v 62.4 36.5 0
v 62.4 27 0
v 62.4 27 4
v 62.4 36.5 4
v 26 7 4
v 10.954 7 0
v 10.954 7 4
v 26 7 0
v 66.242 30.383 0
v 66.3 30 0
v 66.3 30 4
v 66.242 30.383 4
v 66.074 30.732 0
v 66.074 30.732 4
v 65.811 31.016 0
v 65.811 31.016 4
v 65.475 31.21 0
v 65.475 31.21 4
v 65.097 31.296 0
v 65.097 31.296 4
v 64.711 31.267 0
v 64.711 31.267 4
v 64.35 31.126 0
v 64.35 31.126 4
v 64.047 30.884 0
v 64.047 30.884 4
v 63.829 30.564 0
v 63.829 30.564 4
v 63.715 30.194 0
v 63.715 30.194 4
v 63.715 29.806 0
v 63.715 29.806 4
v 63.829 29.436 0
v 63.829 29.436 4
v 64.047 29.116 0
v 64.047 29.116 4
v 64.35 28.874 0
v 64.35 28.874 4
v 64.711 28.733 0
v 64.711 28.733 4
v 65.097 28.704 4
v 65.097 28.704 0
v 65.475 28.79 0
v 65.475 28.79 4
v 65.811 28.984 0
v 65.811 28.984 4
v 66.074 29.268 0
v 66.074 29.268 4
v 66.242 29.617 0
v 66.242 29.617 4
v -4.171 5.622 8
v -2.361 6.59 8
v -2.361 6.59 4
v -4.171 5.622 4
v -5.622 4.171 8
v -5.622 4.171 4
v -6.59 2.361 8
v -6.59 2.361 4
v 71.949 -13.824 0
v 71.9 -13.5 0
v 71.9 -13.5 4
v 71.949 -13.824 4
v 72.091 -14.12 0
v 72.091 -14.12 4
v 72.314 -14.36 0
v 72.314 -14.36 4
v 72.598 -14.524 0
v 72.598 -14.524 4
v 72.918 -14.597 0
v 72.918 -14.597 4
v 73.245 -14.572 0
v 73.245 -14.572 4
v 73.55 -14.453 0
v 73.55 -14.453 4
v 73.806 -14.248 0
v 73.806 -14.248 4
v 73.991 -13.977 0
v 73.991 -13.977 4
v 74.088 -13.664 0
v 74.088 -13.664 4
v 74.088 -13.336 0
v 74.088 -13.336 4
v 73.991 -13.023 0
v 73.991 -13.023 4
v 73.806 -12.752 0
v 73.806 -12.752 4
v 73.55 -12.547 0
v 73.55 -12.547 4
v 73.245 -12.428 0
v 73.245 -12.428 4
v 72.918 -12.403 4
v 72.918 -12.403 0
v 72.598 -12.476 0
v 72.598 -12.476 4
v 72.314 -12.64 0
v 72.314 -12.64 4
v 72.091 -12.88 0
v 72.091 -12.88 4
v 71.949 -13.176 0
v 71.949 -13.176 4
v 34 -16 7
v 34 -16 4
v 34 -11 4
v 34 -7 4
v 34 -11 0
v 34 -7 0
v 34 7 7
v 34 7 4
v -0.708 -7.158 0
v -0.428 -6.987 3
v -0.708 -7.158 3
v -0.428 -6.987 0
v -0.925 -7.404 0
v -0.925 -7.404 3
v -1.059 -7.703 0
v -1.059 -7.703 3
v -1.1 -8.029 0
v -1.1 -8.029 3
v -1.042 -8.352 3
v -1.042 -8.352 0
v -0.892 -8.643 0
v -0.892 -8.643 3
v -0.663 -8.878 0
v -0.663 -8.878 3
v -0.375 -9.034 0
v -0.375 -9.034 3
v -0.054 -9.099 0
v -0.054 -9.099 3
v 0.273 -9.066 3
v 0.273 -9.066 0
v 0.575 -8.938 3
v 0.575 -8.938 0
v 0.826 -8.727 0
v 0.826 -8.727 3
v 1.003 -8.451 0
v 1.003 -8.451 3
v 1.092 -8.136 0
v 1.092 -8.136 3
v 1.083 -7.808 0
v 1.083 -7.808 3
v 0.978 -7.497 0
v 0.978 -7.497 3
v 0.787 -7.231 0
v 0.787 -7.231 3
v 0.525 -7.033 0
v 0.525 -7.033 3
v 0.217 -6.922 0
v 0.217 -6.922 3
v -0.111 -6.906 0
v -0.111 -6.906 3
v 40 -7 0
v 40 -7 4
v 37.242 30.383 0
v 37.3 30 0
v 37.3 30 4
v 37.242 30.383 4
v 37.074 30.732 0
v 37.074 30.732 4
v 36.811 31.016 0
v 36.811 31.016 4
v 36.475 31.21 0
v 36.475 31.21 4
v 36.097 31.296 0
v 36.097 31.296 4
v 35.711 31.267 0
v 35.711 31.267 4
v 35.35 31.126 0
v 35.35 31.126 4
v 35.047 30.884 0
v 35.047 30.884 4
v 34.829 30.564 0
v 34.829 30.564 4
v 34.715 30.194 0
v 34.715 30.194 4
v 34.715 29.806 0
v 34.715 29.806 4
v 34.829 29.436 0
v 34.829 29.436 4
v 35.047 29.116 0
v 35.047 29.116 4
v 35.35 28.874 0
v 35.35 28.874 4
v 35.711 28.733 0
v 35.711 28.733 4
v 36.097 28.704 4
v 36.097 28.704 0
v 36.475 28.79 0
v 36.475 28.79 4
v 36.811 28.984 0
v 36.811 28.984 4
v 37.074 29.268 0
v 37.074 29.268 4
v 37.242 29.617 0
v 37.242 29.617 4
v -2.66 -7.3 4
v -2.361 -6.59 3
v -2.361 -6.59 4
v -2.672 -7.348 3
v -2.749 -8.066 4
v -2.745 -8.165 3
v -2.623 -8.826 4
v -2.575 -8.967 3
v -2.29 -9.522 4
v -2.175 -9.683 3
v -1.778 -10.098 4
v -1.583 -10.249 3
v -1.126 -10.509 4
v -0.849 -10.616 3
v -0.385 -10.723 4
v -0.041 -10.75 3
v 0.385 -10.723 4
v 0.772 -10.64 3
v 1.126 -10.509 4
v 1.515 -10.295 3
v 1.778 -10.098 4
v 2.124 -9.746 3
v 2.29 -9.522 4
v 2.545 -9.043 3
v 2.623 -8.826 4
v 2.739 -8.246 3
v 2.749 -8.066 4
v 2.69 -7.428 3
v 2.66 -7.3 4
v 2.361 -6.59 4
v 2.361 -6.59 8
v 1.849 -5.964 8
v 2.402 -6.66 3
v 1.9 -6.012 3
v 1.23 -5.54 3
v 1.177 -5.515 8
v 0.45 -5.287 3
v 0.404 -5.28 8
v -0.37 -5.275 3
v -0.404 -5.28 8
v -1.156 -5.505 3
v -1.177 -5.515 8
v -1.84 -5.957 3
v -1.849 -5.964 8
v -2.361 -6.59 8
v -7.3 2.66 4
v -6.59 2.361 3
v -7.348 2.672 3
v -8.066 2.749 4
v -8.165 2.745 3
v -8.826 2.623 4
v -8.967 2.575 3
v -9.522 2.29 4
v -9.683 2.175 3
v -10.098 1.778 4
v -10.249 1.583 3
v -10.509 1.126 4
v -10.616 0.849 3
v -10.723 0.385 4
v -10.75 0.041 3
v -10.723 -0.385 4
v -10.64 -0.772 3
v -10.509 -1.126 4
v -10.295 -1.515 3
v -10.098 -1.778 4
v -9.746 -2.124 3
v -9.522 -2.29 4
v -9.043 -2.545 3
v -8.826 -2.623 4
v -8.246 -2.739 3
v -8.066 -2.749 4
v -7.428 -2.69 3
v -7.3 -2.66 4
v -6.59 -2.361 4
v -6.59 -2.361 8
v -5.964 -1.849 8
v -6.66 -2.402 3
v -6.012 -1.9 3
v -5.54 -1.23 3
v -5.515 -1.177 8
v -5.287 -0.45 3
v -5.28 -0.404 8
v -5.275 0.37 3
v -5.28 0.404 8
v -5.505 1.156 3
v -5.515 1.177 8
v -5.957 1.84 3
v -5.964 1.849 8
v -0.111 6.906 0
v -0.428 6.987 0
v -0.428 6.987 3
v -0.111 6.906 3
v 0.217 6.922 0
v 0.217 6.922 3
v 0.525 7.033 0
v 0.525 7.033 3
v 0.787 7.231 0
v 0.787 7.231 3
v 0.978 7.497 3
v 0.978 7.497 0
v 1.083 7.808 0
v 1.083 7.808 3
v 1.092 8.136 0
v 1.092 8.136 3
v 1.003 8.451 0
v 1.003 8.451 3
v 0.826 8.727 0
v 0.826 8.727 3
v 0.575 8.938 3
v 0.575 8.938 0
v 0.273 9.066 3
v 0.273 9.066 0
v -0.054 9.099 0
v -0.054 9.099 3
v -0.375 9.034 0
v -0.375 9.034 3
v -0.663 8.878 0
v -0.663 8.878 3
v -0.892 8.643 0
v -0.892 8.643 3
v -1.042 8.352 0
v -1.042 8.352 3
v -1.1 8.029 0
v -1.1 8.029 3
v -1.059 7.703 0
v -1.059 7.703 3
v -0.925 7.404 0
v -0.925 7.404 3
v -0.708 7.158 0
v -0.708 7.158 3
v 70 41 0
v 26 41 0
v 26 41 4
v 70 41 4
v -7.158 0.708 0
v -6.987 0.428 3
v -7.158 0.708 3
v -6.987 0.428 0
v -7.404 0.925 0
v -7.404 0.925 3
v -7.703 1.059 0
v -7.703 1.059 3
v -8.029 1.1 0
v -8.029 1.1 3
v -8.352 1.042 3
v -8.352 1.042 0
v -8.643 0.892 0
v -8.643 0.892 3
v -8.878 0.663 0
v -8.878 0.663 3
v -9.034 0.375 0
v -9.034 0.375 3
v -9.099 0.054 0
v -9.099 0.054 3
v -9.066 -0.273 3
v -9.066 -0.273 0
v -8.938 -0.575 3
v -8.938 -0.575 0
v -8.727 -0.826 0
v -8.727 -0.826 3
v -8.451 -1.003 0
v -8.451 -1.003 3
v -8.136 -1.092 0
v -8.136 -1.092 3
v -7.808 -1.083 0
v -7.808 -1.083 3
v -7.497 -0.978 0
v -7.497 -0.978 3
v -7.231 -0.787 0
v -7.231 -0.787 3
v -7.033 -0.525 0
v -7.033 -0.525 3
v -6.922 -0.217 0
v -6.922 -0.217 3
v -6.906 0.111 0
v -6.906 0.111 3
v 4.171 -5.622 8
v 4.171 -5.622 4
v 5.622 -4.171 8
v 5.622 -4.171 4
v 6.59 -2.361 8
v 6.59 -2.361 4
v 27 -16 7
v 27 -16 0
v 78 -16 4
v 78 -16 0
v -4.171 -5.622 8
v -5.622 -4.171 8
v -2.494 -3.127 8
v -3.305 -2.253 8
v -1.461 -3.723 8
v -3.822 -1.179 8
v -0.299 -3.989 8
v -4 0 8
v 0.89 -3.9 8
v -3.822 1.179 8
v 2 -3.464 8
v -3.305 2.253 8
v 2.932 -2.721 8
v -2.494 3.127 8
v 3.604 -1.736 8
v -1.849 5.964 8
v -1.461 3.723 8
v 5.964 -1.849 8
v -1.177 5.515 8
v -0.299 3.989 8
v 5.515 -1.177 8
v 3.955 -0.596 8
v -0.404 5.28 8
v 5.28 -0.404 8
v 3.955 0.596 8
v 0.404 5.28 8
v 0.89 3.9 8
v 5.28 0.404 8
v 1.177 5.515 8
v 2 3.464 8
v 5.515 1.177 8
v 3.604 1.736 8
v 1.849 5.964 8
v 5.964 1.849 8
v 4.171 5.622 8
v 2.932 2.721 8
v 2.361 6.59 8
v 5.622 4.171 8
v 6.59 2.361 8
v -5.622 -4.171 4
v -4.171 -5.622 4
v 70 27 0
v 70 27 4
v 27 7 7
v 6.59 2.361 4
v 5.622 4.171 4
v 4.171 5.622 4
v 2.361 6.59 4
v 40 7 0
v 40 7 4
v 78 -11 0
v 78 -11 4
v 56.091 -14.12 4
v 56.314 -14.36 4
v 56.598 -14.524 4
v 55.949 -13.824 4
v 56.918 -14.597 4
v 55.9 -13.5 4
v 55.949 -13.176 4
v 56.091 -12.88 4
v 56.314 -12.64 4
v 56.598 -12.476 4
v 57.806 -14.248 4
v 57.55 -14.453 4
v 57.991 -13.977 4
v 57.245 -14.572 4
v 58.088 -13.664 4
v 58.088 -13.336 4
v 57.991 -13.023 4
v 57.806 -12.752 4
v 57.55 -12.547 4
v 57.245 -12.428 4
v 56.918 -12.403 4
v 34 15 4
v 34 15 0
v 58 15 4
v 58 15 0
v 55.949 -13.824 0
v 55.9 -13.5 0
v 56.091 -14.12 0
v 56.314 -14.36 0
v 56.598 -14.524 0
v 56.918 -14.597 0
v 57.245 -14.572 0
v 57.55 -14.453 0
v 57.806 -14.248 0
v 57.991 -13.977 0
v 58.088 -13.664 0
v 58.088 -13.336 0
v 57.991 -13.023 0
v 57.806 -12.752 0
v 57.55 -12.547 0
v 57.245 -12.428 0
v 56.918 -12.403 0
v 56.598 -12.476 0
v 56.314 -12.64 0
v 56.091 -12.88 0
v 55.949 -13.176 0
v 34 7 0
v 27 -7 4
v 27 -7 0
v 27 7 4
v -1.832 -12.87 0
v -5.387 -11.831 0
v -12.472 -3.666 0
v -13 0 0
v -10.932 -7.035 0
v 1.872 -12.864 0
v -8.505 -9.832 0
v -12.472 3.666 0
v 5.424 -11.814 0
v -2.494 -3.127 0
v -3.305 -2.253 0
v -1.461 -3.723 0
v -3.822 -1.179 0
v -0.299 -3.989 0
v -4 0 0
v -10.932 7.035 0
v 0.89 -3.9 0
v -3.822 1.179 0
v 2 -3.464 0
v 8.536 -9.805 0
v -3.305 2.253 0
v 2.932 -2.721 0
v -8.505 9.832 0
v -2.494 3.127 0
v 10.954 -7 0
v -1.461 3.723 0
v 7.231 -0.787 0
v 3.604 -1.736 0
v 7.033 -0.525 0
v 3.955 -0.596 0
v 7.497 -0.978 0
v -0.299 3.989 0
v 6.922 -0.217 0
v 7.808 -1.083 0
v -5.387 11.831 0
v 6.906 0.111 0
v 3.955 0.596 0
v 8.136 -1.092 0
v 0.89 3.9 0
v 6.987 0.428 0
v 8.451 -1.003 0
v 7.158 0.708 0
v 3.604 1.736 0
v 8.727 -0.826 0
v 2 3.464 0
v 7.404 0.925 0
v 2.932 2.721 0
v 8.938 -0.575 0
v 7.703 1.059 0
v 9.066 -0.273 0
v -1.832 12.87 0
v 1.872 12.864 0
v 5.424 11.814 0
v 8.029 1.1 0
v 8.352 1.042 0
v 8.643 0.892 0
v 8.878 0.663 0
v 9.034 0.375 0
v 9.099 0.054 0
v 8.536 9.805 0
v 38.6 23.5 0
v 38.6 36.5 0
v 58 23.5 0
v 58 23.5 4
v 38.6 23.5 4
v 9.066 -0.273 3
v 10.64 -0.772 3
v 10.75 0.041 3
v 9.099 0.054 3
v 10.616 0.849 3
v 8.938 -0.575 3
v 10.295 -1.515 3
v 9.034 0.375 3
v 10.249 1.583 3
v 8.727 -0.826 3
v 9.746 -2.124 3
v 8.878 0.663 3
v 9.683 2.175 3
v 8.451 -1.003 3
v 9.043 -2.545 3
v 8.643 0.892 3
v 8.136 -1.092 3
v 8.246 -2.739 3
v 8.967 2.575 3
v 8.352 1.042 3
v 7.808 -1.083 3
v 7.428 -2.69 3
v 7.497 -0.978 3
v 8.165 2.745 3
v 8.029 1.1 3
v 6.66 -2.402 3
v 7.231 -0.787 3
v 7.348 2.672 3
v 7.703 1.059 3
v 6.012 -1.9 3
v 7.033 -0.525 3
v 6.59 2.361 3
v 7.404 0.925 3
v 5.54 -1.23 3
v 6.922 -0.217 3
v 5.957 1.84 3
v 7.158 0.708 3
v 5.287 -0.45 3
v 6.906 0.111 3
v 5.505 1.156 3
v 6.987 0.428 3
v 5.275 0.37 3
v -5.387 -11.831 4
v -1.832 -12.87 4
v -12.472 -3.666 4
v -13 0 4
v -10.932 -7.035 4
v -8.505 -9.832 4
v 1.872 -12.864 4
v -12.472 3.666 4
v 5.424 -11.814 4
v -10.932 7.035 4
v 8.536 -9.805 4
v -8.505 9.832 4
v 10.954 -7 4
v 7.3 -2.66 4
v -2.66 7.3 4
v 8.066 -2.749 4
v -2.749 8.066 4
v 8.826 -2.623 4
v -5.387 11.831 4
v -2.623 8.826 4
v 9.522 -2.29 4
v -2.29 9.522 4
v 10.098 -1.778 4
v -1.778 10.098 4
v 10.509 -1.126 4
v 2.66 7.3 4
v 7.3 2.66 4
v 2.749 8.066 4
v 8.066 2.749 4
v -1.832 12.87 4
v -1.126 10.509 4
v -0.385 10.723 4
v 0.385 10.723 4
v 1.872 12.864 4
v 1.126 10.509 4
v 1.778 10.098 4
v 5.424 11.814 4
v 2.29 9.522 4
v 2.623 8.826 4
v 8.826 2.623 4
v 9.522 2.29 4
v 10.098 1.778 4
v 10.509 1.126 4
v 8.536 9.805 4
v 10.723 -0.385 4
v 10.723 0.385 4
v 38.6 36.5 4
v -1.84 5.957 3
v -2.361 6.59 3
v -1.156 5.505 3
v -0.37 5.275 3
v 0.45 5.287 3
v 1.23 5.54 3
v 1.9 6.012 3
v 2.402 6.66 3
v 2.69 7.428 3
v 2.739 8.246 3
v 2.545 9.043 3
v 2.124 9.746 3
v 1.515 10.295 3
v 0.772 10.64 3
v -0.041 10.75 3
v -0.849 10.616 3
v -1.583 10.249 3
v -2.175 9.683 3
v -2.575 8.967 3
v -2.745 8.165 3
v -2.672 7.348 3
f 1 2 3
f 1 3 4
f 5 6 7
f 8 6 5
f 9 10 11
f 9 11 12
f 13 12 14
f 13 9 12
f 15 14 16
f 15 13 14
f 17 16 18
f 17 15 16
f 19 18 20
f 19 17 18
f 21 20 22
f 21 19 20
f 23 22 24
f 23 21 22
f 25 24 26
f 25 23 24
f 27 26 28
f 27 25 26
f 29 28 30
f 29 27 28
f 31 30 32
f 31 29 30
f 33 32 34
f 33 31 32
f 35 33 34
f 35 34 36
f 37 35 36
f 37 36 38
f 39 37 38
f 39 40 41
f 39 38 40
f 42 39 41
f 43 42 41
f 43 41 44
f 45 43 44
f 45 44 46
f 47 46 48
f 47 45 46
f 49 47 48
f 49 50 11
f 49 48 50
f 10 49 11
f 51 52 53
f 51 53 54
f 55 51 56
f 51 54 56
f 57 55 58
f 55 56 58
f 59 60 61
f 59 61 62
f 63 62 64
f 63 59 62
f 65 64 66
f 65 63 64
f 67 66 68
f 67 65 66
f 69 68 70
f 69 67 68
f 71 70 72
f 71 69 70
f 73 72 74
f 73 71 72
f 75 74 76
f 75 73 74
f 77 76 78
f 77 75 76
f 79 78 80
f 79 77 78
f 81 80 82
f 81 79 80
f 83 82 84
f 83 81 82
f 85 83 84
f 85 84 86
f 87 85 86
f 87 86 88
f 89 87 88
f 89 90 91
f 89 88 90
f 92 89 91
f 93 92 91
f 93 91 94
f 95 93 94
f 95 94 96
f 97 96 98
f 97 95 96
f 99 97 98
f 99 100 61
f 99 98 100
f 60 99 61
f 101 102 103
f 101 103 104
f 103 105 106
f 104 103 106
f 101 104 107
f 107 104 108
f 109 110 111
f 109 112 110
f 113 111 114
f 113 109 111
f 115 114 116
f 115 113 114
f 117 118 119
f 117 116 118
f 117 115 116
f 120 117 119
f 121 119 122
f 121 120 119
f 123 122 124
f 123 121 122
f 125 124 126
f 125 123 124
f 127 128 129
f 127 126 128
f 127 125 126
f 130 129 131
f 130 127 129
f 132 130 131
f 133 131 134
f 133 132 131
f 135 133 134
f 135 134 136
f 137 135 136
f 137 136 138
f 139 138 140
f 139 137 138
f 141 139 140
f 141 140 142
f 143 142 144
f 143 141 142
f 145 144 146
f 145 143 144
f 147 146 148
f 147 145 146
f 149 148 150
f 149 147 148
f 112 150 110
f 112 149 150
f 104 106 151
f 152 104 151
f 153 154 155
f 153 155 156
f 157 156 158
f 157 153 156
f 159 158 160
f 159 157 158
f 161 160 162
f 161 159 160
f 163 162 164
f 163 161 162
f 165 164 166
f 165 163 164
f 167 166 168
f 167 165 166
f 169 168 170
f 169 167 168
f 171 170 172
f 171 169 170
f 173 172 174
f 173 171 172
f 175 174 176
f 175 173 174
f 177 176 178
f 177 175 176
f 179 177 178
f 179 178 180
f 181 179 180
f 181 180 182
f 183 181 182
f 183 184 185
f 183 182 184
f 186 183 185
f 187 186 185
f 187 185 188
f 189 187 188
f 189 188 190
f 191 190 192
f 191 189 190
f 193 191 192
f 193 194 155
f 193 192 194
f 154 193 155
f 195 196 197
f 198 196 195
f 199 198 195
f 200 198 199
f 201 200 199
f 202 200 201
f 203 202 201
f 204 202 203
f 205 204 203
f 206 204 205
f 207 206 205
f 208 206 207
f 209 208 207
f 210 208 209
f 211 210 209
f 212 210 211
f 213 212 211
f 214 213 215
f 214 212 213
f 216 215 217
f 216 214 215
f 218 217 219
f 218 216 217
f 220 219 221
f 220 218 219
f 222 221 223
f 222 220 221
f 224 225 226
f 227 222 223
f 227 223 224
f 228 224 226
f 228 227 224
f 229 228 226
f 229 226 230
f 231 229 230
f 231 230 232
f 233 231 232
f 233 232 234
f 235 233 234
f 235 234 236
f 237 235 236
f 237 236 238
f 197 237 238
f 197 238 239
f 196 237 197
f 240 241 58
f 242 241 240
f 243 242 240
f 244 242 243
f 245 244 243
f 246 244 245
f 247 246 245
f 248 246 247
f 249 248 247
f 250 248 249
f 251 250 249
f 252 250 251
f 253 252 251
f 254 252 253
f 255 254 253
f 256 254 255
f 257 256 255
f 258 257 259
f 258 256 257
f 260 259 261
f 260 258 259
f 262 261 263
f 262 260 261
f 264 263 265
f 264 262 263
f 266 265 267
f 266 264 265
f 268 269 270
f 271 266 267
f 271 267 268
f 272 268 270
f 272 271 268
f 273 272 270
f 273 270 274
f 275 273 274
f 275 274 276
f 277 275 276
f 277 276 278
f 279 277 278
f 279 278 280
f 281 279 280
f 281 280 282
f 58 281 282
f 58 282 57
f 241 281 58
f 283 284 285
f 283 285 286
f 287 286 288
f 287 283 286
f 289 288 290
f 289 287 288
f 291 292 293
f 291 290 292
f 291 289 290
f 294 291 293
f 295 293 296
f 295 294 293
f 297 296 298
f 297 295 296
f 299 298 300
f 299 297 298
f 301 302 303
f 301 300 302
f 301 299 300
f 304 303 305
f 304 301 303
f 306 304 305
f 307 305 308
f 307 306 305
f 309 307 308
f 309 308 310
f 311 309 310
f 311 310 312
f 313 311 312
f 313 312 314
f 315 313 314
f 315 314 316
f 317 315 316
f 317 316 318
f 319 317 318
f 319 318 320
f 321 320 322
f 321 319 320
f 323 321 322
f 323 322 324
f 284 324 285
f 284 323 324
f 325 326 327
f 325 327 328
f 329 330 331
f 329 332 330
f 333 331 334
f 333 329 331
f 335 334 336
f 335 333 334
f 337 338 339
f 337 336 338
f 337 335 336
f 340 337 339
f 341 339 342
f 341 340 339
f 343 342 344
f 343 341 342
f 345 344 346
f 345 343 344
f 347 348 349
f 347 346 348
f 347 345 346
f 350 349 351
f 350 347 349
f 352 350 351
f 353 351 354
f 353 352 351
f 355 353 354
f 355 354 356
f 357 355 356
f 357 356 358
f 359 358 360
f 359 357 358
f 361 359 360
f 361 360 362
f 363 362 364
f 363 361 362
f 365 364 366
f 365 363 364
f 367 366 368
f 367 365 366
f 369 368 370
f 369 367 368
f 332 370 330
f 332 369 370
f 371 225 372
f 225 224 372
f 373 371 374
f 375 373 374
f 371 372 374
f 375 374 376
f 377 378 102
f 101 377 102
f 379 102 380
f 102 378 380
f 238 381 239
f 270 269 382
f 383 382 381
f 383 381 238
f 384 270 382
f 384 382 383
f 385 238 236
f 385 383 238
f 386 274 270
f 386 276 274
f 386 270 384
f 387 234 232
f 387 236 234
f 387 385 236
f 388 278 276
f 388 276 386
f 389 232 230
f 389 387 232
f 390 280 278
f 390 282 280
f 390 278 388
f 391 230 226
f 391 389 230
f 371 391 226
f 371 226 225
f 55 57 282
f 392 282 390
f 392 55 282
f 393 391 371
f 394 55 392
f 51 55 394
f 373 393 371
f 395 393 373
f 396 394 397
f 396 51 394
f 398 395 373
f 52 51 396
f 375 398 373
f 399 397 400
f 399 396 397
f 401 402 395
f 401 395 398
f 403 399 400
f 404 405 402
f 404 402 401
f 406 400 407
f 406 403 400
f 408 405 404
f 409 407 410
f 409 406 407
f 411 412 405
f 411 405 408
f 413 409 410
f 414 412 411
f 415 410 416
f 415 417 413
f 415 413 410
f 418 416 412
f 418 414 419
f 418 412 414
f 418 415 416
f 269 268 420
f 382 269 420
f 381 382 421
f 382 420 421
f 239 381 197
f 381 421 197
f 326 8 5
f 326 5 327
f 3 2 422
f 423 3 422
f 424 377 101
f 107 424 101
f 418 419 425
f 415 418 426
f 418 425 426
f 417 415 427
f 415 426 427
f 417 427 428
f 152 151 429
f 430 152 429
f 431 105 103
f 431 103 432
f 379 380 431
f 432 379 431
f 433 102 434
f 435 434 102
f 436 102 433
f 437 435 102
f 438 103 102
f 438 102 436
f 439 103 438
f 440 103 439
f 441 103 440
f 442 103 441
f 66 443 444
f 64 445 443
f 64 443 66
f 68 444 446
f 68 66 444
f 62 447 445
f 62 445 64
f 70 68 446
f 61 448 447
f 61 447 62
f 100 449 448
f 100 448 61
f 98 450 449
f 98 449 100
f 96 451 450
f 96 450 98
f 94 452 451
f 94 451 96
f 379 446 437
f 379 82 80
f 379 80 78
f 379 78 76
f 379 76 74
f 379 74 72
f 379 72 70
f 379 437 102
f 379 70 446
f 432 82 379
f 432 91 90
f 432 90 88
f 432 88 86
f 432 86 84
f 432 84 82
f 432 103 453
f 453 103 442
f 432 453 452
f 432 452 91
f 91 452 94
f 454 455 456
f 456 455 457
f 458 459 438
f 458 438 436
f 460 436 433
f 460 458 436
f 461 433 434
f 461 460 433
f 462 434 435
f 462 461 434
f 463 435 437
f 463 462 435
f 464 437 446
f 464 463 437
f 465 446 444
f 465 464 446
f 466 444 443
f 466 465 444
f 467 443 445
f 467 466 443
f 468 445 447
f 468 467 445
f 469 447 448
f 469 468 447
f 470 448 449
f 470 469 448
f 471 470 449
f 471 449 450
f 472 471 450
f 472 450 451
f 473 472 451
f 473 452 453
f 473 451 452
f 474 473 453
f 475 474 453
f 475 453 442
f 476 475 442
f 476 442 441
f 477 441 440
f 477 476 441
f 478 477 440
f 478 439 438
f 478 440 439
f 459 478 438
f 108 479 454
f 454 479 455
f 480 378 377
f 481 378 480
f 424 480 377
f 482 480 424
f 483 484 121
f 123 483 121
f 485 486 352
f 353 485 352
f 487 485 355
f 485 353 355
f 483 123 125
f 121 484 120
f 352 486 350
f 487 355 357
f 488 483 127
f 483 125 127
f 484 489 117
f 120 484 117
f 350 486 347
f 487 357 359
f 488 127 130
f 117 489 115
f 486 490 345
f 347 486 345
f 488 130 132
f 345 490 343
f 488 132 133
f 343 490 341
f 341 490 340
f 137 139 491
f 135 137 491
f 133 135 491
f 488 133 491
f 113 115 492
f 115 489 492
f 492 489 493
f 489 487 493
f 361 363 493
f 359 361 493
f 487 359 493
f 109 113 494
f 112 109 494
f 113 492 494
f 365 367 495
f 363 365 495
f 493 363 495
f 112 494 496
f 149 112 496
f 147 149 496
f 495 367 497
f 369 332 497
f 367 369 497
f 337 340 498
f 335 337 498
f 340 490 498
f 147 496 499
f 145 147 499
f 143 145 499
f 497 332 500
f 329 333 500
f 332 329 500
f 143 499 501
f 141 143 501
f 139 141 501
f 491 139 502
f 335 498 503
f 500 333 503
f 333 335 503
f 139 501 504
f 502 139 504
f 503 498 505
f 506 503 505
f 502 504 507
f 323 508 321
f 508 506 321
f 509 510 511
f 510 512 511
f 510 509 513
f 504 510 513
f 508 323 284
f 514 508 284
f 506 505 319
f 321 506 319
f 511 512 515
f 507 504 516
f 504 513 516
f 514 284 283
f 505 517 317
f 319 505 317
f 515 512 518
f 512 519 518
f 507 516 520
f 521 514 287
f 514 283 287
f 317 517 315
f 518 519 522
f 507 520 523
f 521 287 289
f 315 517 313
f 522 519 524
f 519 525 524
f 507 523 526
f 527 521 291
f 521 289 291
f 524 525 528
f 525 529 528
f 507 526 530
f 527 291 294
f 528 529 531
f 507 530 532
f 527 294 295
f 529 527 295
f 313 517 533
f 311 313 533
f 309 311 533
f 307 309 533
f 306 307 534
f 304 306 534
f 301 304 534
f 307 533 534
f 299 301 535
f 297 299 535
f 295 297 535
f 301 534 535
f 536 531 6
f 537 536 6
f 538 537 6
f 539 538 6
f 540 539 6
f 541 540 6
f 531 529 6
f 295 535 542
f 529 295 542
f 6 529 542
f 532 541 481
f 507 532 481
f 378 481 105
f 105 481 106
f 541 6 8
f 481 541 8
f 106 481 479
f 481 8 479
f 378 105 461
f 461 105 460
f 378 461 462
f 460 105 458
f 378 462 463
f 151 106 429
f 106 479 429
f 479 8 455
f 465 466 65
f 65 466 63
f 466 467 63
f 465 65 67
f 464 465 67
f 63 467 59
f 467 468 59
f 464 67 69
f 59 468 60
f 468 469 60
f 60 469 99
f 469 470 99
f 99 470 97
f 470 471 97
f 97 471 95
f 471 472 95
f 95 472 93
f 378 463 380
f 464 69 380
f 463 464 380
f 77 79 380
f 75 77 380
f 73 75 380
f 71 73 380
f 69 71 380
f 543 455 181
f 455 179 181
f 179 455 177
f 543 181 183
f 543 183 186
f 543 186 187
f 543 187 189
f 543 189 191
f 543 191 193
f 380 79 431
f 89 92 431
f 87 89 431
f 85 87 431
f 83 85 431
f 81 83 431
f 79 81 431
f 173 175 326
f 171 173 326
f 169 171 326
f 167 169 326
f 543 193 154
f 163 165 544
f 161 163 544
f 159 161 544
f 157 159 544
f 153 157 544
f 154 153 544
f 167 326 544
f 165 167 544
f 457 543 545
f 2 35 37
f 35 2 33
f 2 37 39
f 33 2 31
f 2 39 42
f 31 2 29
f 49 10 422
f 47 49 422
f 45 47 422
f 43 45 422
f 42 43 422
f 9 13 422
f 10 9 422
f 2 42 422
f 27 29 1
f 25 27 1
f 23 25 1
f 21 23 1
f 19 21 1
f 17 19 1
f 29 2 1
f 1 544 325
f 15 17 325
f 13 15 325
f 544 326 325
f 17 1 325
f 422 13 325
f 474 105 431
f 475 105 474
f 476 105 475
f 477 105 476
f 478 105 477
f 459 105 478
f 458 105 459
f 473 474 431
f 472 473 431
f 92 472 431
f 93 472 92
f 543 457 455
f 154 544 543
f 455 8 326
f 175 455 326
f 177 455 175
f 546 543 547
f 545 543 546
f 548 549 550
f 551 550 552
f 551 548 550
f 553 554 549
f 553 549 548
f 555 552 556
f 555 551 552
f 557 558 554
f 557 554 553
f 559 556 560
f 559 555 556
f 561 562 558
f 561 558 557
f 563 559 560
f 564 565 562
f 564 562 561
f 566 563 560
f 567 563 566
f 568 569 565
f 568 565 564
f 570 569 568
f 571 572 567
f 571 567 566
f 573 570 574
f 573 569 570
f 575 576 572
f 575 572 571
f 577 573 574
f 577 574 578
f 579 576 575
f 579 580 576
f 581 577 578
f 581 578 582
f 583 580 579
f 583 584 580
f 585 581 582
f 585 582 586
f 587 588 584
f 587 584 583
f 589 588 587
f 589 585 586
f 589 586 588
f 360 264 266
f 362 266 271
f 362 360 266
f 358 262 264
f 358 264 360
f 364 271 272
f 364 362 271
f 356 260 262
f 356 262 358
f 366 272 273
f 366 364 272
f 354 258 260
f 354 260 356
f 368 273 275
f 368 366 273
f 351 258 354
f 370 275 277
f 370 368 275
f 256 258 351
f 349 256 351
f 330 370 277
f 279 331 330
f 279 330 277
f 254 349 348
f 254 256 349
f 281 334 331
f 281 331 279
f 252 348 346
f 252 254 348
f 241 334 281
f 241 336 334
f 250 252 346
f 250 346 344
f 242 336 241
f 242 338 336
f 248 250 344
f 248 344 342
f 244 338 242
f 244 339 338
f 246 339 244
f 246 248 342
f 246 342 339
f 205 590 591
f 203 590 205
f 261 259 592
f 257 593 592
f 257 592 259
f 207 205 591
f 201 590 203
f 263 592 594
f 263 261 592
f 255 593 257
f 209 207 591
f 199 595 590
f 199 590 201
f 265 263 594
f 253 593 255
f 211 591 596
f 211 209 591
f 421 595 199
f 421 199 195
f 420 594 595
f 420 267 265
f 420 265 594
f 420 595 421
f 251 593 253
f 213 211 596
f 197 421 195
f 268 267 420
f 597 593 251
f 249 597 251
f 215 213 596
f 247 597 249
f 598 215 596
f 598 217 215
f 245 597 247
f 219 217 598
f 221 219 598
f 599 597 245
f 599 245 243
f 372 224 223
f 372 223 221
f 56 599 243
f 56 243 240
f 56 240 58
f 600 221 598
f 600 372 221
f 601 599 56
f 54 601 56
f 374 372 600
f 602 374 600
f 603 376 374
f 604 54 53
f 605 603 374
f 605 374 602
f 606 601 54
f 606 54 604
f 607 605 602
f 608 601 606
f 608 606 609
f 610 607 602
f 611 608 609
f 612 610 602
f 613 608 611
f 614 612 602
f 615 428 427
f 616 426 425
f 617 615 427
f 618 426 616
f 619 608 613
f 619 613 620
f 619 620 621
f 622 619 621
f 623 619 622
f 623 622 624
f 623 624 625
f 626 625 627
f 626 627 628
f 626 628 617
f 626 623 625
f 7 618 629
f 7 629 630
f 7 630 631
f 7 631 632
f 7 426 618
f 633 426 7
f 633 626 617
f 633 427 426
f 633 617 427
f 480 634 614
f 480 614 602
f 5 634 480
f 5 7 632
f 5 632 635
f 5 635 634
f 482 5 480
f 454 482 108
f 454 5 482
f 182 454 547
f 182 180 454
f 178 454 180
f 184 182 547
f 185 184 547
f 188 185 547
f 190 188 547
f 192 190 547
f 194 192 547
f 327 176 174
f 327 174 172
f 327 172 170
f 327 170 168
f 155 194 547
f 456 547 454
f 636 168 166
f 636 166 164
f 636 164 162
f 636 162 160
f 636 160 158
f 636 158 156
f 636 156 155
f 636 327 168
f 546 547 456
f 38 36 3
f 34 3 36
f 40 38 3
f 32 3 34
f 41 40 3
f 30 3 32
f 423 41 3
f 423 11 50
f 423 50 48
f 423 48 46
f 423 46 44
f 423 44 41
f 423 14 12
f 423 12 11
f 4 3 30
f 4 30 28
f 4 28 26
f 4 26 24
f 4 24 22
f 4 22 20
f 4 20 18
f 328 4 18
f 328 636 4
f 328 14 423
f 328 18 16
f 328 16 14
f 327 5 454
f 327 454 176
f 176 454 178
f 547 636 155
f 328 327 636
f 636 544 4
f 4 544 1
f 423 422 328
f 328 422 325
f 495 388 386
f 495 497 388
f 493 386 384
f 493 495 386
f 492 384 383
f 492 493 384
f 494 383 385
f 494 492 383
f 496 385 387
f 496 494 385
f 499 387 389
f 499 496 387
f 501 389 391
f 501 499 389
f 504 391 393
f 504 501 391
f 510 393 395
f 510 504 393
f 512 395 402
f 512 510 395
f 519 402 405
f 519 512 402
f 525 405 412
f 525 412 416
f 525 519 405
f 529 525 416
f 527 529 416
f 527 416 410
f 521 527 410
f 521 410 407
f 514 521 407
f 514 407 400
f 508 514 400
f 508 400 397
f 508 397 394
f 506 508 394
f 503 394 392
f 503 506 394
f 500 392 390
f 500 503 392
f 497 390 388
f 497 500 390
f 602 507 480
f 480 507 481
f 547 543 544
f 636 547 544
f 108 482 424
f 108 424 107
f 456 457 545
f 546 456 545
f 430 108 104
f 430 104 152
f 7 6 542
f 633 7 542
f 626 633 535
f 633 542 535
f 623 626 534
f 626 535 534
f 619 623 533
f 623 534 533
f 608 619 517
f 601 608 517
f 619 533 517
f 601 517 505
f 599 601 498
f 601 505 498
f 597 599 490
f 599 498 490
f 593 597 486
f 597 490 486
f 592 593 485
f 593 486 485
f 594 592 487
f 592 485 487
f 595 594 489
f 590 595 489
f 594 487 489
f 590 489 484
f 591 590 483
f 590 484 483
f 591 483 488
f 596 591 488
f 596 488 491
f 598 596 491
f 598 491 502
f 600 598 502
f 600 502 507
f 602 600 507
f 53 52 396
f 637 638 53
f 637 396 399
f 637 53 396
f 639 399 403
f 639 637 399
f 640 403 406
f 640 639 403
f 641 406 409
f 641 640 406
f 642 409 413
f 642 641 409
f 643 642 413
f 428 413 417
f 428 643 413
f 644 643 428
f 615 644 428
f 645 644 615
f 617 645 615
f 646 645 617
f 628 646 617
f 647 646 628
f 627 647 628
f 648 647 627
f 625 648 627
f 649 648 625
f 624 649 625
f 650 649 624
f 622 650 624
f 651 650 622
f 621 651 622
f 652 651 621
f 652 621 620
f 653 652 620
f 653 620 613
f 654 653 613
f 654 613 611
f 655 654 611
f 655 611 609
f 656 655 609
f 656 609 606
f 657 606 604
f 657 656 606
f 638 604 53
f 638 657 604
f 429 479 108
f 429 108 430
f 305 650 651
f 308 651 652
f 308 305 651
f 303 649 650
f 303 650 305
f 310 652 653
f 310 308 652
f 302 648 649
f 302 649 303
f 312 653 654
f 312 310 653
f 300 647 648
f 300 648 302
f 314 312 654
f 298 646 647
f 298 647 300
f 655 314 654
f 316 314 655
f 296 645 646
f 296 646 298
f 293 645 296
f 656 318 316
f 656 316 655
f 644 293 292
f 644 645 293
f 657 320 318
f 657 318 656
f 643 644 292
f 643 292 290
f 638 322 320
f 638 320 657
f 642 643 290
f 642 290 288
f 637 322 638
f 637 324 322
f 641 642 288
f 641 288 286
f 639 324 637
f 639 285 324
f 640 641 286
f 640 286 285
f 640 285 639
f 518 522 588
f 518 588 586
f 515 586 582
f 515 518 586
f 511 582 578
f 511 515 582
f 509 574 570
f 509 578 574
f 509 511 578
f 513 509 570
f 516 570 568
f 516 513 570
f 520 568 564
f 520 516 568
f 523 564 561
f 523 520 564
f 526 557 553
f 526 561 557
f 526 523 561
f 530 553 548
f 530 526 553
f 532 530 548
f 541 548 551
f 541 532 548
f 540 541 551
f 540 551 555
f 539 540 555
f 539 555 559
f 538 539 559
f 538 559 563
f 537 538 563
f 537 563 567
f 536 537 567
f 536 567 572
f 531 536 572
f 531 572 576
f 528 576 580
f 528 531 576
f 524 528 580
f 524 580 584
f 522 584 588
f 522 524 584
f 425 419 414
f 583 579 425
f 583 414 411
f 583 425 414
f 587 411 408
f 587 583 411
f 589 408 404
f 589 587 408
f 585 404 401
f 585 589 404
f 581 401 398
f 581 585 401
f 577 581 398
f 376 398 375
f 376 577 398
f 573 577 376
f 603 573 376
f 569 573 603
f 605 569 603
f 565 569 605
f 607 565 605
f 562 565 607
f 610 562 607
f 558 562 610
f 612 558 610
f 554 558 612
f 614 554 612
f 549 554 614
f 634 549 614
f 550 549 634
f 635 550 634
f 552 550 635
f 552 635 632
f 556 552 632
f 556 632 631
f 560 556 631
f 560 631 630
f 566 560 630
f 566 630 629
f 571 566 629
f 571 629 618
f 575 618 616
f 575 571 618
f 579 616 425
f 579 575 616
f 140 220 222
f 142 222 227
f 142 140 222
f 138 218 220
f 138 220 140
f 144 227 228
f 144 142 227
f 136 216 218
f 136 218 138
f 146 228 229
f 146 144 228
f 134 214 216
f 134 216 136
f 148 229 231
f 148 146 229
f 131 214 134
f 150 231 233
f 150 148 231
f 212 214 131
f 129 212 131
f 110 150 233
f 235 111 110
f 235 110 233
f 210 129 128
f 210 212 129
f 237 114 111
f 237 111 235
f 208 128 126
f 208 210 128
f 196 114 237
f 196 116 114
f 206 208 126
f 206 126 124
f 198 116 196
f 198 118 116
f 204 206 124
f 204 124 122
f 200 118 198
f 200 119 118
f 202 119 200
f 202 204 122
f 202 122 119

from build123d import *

# Parameters (mm, degrees)
ELBOW_HORN_FLANGE_PROFILE_R          = 13
ELBOW_HORN_FLANGE_DEPTH              = 4
FOREARM_WEB_PROFILE_W                = 40
FOREARM_WEB_PROFILE_H                = 14
FOREARM_WEB_DEPTH                    = 4
GRIPPER_MOUNT_RIB_PROFILE_W          = 8
GRIPPER_MOUNT_RIB_PROFILE_H          = 30
GRIPPER_MOUNT_RIB_DEPTH              = 4
GRIPPER_SERVO_MOUNT_PROFILE_W        = 44
GRIPPER_SERVO_MOUNT_PROFILE_H        = 26
GRIPPER_SERVO_MOUNT_DEPTH            = 4
GRIP_SG90_BODY_CLEARANCE_START       = -5
GRIP_SG90_BODY_CLEARANCE_PROFILE_W   = 23.8
GRIP_SG90_BODY_CLEARANCE_PROFILE_H   = 13
GRIP_SG90_BODY_CLEARANCE_DEPTH       = 87.221918224
MOVING_FINGER_SWEEP_RELIEF_START     = -5
MOVING_FINGER_SWEEP_RELIEF_PROFILE_W = 13
MOVING_FINGER_SWEEP_RELIEF_PROFILE_H = 13
MOVING_FINGER_SWEEP_RELIEF_DEPTH     = 87.221918224
GRIP_SERVO_TAB_FASTENERS_START       = -50
GRIP_SERVO_TAB_FASTENERS_PROFILE_R   = 1.3
GRIP_SERVO_TAB_FASTENERS_DEPTH       = 132.221918224
FIXED_FINGER_SPINE_PROFILE_W         = 48
FIXED_FINGER_SPINE_PROFILE_H         = 5
FIXED_FINGER_SPINE_DEPTH             = 4
FIXED_FINGER_ROOT_PROFILE_W          = 7
FIXED_FINGER_ROOT_PROFILE_H          = 23
FIXED_FINGER_ROOT_DEPTH              = 7
ELBOW_CENTER_SCREW_ACCESS_START      = -50
ELBOW_CENTER_SCREW_ACCESS_PROFILE_R  = 4
ELBOW_CENTER_SCREW_ACCESS_DEPTH      = 139.396832522
ELBOW_DOWEL_SUPPORT_HUB_START        = 4
ELBOW_DOWEL_SUPPORT_HUB_PROFILE_R    = 7
ELBOW_DOWEL_SUPPORT_HUB_PROFILE_R_2  = 4
ELBOW_DOWEL_SUPPORT_HUB_DEPTH        = 4
ELBOW_HORN_FASTENERS_START           = -50
ELBOW_HORN_FASTENERS_PROFILE_R       = 1.1
ELBOW_HORN_FASTENERS_DEPTH           = 139.481636513
M2X8_WASHER_AND_HUB_CLEARANCE_START  = 3
ELBOW_HORN_WASHER_RECESS_PROFILE_R   = 2.75
M2X8_WASHER_AND_HUB_CLEARANCE_DEPTH  = 5
FIXED_PAD_KEEPER_FASTENERS_START     = -50
FIXED_PAD_KEEPER_FASTENERS_PROFILE_R = 1.1
FIXED_PAD_KEEPER_FASTENERS_DEPTH     = 139.481636513


with BuildPart() as part:
    # Elbow_horn_flange_profile → Elbow_horn_flange (new body)
    with BuildSketch(Plane.XY):
        Circle(ELBOW_HORN_FLANGE_PROFILE_R)
    extrude(amount=ELBOW_HORN_FLANGE_DEPTH)

    # Forearm_web_profile → Forearm_web (add)
    with BuildSketch(Plane.XY):
        with Locations((20, 0)):
            Rectangle(FOREARM_WEB_PROFILE_W, FOREARM_WEB_PROFILE_H)
    extrude(amount=FOREARM_WEB_DEPTH)

    # Gripper_mount_rib_profile → Gripper_mount_rib (add)
    with BuildSketch(Plane.XY):
        with Locations((30, 15)):
            Rectangle(GRIPPER_MOUNT_RIB_PROFILE_W, GRIPPER_MOUNT_RIB_PROFILE_H)
    extrude(amount=GRIPPER_MOUNT_RIB_DEPTH)

    # Gripper_servo_mount_profile → Gripper_servo_mount (add)
    with BuildSketch(Plane.XY):
        with Locations((48, 28)):
            Rectangle(GRIPPER_SERVO_MOUNT_PROFILE_W, GRIPPER_SERVO_MOUNT_PROFILE_H)
    extrude(amount=GRIPPER_SERVO_MOUNT_DEPTH)

    # Grip_SG90_body_clearance_profile → Grip_SG90_body_clearance (cut, through all)
    with BuildSketch(Plane.XY.offset(GRIP_SG90_BODY_CLEARANCE_START)):
        with Locations((50.5, 30)):
            Rectangle(GRIP_SG90_BODY_CLEARANCE_PROFILE_W, GRIP_SG90_BODY_CLEARANCE_PROFILE_H)
    extrude(amount=GRIP_SG90_BODY_CLEARANCE_DEPTH, mode=Mode.SUBTRACT)

    # Moving_finger_sweep_relief_profile → Moving_finger_sweep_relief (cut, through all)
    with BuildSketch(Plane.XY.offset(MOVING_FINGER_SWEEP_RELIEF_START)):
        with Locations((64.5, 20.5)):
            Rectangle(MOVING_FINGER_SWEEP_RELIEF_PROFILE_W, MOVING_FINGER_SWEEP_RELIEF_PROFILE_H)
    extrude(amount=MOVING_FINGER_SWEEP_RELIEF_DEPTH, mode=Mode.SUBTRACT)

    # Grip_servo_tab_fasteners_profile → Grip_servo_tab_fasteners (cut, through all)
    with BuildSketch(Plane.XY.offset(GRIP_SERVO_TAB_FASTENERS_START)):
        with Locations((36, 30)):
            Circle(GRIP_SERVO_TAB_FASTENERS_PROFILE_R)
        with Locations((65, 30)):
            Circle(GRIP_SERVO_TAB_FASTENERS_PROFILE_R)
    extrude(amount=GRIP_SERVO_TAB_FASTENERS_DEPTH, mode=Mode.SUBTRACT)



with BuildPart() as body_2:
    # Fixed_finger_spine_profile → Fixed_finger_spine (new body)
    with BuildSketch(Plane.XY):
        with Locations((54, -13.5)):
            Rectangle(FIXED_FINGER_SPINE_PROFILE_W, FIXED_FINGER_SPINE_PROFILE_H)
    extrude(amount=FIXED_FINGER_SPINE_DEPTH)


with BuildPart() as part_1:
    add(part.part)

    add(body_2.part)  # Fixed_finger_root merges body 2
    # Fixed_finger_root_profile → Fixed_finger_root (add)
    with BuildSketch(Plane.XY):
        with Locations((30.5, -4.5)):
            Rectangle(FIXED_FINGER_ROOT_PROFILE_W, FIXED_FINGER_ROOT_PROFILE_H)
    extrude(amount=FIXED_FINGER_ROOT_DEPTH)

    # Elbow_center_screw_access_profile → Elbow_center_screw_access (cut, through all)
    with BuildSketch(Plane.XY.offset(ELBOW_CENTER_SCREW_ACCESS_START)):
        with Locations(Location((0, 0, 0), (0, 0, 180))):
            Circle(ELBOW_CENTER_SCREW_ACCESS_PROFILE_R)
    extrude(amount=ELBOW_CENTER_SCREW_ACCESS_DEPTH, mode=Mode.SUBTRACT)

    # Elbow_dowel_support_hub_profile → Elbow_dowel_support_hub (add)
    with BuildSketch(Plane.XY.offset(ELBOW_DOWEL_SUPPORT_HUB_START)):
        Circle(ELBOW_DOWEL_SUPPORT_HUB_PROFILE_R)
        with Locations(Location((0, 0, 0), (0, 0, 180))):
            Circle(ELBOW_DOWEL_SUPPORT_HUB_PROFILE_R_2, mode=Mode.SUBTRACT)
    extrude(amount=ELBOW_DOWEL_SUPPORT_HUB_DEPTH)

    # Elbow_horn_fasteners_profile → Elbow_horn_fasteners (cut, through all)
    with BuildSketch(Plane.XY.offset(ELBOW_HORN_FASTENERS_START)):
        with Locations(Location((0, -8, 0), (0, 0, 112.9239414))):
            Circle(ELBOW_HORN_FASTENERS_PROFILE_R)
        with Locations(Location((0, 8, 0), (0, 0, 247.0760586))):
            Circle(ELBOW_HORN_FASTENERS_PROFILE_R)
        with Locations(Location((-8, 0, 0), (0, 0, 22.9239414))):
            Circle(ELBOW_HORN_FASTENERS_PROFILE_R)
        with Locations(Location((8, 0, 0), (0, 0, 157.0760586))):
            Circle(ELBOW_HORN_FASTENERS_PROFILE_R)
    extrude(amount=ELBOW_HORN_FASTENERS_DEPTH, mode=Mode.SUBTRACT)

    # Elbow_horn_washer_recess_profile → M2x8_washer_and_hub_clearance (cut)
    with BuildSketch(Plane.XY.offset(M2X8_WASHER_AND_HUB_CLEARANCE_START)):
        with Locations(Location((0, -8, 0), (0, 0, 149.150544772))):
            Circle(ELBOW_HORN_WASHER_RECESS_PROFILE_R)
        with Locations(Location((0, 8, 0), (0, 0, 210.849455228))):
            Circle(ELBOW_HORN_WASHER_RECESS_PROFILE_R)
        with Locations(Location((-8, 0, 0), (0, 0, 59.150544772))):
            Circle(ELBOW_HORN_WASHER_RECESS_PROFILE_R)
        with Locations(Location((8, 0, 0), (0, 0, 120.849455228))):
            Circle(ELBOW_HORN_WASHER_RECESS_PROFILE_R)
    extrude(amount=M2X8_WASHER_AND_HUB_CLEARANCE_DEPTH, mode=Mode.SUBTRACT)

    # Fixed_pad_keeper_fasteners_profile → Fixed_pad_keeper_fasteners (cut, through all)
    with BuildSketch(Plane.XY.offset(FIXED_PAD_KEEPER_FASTENERS_START)):
        with Locations(Location((57, -13.5, 0), (0, 0, 180))):
            Circle(FIXED_PAD_KEEPER_FASTENERS_PROFILE_R)
        with Locations(Location((73, -13.5, 0), (0, 0, 180))):
            Circle(FIXED_PAD_KEEPER_FASTENERS_PROFILE_R)
    extrude(amount=FIXED_PAD_KEEPER_FASTENERS_DEPTH, mode=Mode.SUBTRACT)


solid = part_1.part
